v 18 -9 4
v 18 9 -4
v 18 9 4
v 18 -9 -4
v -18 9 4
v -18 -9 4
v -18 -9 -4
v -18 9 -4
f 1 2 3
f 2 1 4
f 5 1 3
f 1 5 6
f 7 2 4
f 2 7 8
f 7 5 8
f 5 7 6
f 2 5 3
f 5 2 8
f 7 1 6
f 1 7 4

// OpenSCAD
$fn = 50;

difference() {
	union() {
		translate(v = [-18.0, -9.0, -4.0]) {
			cube(size = [36, 18, 8]);
		}
	}
	union();
}
